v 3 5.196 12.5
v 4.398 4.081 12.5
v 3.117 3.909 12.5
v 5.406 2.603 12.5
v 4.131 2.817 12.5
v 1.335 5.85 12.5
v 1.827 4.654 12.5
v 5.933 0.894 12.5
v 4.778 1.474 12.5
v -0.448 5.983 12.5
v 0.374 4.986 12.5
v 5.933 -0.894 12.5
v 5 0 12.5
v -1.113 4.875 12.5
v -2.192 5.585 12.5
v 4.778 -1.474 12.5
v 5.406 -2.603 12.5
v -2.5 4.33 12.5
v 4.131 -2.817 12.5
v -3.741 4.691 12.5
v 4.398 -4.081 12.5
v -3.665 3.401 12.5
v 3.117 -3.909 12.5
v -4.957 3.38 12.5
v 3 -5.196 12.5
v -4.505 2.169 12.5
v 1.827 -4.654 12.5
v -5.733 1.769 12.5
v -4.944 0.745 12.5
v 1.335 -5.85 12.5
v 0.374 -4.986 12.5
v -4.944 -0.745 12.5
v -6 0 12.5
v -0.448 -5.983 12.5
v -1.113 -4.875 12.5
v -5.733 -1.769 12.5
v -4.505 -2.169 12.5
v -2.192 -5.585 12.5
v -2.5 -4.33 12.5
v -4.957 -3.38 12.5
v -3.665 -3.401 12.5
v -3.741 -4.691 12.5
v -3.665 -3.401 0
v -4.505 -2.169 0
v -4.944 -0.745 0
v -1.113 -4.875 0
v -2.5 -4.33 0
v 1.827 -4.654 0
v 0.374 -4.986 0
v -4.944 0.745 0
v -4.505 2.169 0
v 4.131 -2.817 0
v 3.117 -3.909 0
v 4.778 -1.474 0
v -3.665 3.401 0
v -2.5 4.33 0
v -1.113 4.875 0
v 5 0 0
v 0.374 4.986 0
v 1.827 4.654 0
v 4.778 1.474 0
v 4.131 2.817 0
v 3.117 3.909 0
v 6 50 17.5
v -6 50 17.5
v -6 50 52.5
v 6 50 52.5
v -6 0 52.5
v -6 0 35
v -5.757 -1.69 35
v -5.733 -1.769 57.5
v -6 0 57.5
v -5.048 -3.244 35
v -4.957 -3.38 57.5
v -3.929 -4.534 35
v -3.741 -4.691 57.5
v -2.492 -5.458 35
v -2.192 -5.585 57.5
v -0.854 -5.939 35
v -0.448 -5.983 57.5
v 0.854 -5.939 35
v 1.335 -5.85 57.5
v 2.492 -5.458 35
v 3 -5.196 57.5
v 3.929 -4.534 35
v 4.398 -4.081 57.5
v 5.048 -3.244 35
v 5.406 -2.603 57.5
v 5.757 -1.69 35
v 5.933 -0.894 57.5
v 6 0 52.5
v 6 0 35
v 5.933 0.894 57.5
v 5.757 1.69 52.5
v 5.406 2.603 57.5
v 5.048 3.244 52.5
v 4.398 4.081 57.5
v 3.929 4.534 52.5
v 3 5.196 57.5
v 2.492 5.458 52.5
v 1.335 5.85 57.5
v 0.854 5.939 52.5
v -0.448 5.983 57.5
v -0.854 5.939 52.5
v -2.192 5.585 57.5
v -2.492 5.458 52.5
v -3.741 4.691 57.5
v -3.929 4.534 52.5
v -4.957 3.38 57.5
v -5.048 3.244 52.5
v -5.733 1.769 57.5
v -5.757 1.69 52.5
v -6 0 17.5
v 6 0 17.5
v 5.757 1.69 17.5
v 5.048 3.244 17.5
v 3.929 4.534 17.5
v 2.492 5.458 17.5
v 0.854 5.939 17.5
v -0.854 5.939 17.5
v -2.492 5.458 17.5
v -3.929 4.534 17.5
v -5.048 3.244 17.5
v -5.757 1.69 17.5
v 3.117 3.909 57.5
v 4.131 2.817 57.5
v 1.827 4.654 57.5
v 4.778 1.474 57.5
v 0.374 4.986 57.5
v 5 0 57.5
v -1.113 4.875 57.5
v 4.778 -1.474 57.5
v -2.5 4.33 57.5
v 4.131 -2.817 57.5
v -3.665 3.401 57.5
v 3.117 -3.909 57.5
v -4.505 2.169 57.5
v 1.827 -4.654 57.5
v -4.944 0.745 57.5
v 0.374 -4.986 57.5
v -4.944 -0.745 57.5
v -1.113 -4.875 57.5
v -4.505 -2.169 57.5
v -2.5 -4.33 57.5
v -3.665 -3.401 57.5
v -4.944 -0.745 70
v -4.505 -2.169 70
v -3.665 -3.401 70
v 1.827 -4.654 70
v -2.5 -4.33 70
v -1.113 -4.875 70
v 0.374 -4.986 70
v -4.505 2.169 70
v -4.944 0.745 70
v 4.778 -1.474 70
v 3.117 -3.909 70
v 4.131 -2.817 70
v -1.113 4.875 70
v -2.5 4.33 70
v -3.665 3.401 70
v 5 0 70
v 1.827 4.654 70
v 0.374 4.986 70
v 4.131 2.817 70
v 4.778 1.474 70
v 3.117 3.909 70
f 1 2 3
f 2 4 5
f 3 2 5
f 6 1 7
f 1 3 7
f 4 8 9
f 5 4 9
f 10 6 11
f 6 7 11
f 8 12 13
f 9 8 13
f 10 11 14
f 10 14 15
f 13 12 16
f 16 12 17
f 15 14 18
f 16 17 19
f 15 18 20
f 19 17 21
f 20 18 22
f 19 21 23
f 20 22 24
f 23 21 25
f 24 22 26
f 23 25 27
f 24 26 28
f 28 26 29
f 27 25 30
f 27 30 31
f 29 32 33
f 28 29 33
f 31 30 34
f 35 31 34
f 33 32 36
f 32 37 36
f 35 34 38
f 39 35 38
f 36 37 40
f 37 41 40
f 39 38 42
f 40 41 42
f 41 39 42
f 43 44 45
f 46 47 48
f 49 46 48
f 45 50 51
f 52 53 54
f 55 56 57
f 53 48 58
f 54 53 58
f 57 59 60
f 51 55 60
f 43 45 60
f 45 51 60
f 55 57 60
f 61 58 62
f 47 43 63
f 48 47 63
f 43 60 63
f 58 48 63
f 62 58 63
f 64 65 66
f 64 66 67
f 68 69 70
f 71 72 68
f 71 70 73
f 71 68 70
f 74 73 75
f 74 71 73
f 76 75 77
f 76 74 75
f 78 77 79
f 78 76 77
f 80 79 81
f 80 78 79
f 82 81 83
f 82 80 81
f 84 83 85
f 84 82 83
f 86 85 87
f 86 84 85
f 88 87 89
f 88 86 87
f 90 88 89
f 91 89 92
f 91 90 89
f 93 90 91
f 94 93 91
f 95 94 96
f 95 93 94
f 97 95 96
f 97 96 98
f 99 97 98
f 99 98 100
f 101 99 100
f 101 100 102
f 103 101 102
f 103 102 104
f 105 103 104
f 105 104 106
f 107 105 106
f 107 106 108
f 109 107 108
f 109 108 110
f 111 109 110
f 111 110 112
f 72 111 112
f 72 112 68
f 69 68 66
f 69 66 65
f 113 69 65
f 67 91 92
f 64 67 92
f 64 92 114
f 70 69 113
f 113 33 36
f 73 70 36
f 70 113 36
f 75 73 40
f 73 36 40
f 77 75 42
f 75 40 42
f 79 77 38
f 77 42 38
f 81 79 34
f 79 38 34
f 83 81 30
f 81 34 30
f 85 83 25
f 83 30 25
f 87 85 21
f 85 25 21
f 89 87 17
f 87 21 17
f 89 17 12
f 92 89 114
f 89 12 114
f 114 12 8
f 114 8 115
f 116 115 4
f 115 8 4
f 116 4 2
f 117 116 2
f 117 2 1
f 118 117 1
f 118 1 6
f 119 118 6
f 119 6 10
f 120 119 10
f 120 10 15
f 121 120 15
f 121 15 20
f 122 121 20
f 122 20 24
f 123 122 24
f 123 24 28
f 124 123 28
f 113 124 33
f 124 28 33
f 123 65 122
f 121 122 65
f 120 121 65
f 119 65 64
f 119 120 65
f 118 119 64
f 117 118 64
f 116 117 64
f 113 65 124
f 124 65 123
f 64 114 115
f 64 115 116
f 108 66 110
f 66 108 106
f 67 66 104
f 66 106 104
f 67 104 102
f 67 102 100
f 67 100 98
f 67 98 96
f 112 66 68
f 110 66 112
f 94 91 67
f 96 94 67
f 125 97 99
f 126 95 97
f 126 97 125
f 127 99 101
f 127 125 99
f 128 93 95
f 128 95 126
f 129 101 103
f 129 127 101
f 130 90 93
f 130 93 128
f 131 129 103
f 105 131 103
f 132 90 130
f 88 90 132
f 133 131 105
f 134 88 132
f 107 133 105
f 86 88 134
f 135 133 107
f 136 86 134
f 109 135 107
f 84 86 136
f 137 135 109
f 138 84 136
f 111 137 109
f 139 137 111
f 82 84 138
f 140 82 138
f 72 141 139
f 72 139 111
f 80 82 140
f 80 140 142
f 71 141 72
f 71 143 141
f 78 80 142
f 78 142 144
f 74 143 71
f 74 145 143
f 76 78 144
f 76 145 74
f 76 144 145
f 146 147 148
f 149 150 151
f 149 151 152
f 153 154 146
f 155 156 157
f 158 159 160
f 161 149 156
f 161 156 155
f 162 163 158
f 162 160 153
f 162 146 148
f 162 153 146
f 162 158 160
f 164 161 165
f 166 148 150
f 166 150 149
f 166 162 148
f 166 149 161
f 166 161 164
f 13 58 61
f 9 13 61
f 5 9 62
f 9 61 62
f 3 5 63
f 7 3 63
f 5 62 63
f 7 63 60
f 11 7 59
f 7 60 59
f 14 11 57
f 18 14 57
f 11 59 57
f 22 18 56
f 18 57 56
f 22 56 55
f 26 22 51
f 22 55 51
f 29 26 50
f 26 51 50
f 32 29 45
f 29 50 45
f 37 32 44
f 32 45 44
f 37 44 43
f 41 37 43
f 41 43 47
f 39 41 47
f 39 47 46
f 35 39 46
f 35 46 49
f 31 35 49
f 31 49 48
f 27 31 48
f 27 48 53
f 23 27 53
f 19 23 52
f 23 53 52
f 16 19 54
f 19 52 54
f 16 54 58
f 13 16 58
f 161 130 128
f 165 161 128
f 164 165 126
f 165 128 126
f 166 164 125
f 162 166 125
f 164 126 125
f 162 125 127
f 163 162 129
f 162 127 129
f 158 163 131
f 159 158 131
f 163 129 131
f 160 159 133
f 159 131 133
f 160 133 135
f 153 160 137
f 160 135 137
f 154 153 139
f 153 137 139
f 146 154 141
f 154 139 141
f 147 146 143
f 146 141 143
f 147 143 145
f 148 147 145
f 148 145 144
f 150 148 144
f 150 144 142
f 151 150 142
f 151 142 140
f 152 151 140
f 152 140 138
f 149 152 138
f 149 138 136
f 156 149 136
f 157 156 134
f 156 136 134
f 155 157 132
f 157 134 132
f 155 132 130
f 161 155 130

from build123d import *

# Parameters (mm, degrees)
SKETCH_1_R      = 5
EXTRUDE_1_DEPTH = 12.5
SKETCH_2_R      = 6
EXTRUDE_2_DEPTH = 22.5
SKETCH_3_R      = 5
EXTRUDE_3_DEPTH = 12.5
SKETCH_4_W      = 12
SKETCH_4_H      = 35
EXTRUDE_4_DEPTH = 50


with BuildPart() as part:
    # 草图1 → 凸台-拉伸1 (new body)
    with BuildSketch(Plane.XY):
        Circle(SKETCH_1_R)
    extrude(amount=EXTRUDE_1_DEPTH)

    # 草图2 → 凸台-拉伸2 (add)
    with BuildSketch(Plane.XY.offset(12.5)):
        with Locations(Location((0, 0, 0), (0, 0, 180))):
            Circle(SKETCH_2_R)
    extrude_2 = extrude(amount=EXTRUDE_2_DEPTH)

    # 镜向2: 凸台-拉伸2 across plane
    add(extrude_2.mirror(Plane.XY.offset(35)))

    # 草图3 → 凸台-拉伸3 (add)
    with BuildSketch(Plane.XY.offset(57.5)):
        Circle(SKETCH_3_R)
    extrude(amount=EXTRUDE_3_DEPTH)

    # 草图4 → 凸台-拉伸4 (add)
    with BuildSketch(Plane(origin=(0, 0, 0), x_dir=(1, 0, 0), z_dir=(0, 1, 0))):
        with Locations((0, -35)):
            Rectangle(SKETCH_4_W, SKETCH_4_H)
    extrude(amount=EXTRUDE_4_DEPTH)


solid = part.part
